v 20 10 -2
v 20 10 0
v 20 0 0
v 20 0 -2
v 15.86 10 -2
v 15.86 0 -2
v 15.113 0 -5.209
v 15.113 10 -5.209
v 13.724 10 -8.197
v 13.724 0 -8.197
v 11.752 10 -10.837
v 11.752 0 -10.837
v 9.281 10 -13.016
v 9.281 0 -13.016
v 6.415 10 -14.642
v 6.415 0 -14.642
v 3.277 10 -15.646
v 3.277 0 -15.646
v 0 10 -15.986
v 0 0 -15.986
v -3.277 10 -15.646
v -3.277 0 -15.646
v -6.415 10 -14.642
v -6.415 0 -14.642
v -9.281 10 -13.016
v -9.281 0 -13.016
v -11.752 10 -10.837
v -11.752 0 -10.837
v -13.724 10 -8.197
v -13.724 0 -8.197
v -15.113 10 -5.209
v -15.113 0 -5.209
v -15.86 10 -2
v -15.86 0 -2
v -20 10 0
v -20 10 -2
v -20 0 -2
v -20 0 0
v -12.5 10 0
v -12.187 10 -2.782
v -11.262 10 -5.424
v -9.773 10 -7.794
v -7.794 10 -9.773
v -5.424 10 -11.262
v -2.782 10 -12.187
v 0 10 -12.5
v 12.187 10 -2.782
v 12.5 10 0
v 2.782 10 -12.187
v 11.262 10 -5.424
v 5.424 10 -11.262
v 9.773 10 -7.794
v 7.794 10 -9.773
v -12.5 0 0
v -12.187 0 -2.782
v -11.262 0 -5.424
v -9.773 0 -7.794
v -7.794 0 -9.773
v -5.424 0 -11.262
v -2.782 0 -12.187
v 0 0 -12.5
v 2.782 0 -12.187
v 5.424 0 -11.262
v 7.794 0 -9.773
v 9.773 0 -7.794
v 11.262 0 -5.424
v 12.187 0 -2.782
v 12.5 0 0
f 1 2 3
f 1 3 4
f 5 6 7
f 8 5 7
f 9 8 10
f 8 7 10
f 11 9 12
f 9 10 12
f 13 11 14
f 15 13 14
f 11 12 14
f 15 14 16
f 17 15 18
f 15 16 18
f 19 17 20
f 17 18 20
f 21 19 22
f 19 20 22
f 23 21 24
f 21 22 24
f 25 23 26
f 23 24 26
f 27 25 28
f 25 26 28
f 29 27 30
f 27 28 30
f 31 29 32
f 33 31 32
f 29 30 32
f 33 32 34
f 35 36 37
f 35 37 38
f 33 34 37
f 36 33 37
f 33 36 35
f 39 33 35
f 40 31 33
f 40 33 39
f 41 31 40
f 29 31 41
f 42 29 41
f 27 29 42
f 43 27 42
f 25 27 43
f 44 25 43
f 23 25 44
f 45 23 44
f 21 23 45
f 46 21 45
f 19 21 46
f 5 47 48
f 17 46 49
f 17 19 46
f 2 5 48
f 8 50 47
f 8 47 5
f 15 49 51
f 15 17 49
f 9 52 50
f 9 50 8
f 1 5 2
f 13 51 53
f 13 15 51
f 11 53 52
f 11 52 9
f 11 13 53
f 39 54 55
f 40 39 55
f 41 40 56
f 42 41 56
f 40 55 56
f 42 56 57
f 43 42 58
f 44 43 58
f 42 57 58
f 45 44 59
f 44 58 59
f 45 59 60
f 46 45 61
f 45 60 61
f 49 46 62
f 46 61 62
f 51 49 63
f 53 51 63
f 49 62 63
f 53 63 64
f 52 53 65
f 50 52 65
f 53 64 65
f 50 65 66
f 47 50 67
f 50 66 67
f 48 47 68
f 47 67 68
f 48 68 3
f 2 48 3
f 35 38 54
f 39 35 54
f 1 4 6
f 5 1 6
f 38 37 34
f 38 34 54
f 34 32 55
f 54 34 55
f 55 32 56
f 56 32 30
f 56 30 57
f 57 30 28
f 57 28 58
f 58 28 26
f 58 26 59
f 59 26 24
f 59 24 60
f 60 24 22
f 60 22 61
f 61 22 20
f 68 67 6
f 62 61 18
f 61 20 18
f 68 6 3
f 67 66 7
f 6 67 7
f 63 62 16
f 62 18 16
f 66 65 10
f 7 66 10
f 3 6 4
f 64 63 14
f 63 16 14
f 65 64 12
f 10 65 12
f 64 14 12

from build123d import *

# Parameters (mm, degrees)
BOSS_EXTRUDE1_DEPTH = 10


with BuildPart() as part:
    # Sketch1 → Boss-Extrude1 (new body)
    with BuildSketch(Plane(origin=(0, 0, 0), x_dir=(1, 0, 0), z_dir=(0, 1, 0))):
        with BuildLine():
            Line((-20, 0), (-15.985928344, 0))
            ThreePointArc((-15.985928344, 0), (-15.954496575, 1.001970088), (-15.860324871, 2))
            Line((-15.860324871, 2), (-19.202832359, 2))
            Line((-19.202832359, 2), (-20, 2))
            Line((-20, 2), (-20, 0))
        make_face()
        with BuildLine():
            Line((-15.985928344, 0), (-12.5, 0))
            ThreePointArc((-12.5, 0), (0, 12.5), (12.5, 0))
            Line((12.5, 0), (15.985928344, 0))
            ThreePointArc((15.985928344, 0), (15.954496575, 1.001970088), (15.860324871, 2))
            ThreePointArc((15.860324871, 2), (0, 15.985928344), (-15.860324871, 2))
            ThreePointArc((-15.860324871, 2), (-15.954496575, 1.001970088), (-15.985928344, 0))
        make_face()
        with BuildLine():
            ThreePointArc((15.860324871, 2), (15.954496575, 1.001970088), (15.985928344, 0))
            Line((15.985928344, 0), (20, 0))
            Line((20, 0), (20, 2))
            Line((20, 2), (19.202832359, 2))
            Line((19.202832359, 2), (15.860324871, 2))
        make_face()
    extrude(amount=BOSS_EXTRUDE1_DEPTH)


solid = part.part
